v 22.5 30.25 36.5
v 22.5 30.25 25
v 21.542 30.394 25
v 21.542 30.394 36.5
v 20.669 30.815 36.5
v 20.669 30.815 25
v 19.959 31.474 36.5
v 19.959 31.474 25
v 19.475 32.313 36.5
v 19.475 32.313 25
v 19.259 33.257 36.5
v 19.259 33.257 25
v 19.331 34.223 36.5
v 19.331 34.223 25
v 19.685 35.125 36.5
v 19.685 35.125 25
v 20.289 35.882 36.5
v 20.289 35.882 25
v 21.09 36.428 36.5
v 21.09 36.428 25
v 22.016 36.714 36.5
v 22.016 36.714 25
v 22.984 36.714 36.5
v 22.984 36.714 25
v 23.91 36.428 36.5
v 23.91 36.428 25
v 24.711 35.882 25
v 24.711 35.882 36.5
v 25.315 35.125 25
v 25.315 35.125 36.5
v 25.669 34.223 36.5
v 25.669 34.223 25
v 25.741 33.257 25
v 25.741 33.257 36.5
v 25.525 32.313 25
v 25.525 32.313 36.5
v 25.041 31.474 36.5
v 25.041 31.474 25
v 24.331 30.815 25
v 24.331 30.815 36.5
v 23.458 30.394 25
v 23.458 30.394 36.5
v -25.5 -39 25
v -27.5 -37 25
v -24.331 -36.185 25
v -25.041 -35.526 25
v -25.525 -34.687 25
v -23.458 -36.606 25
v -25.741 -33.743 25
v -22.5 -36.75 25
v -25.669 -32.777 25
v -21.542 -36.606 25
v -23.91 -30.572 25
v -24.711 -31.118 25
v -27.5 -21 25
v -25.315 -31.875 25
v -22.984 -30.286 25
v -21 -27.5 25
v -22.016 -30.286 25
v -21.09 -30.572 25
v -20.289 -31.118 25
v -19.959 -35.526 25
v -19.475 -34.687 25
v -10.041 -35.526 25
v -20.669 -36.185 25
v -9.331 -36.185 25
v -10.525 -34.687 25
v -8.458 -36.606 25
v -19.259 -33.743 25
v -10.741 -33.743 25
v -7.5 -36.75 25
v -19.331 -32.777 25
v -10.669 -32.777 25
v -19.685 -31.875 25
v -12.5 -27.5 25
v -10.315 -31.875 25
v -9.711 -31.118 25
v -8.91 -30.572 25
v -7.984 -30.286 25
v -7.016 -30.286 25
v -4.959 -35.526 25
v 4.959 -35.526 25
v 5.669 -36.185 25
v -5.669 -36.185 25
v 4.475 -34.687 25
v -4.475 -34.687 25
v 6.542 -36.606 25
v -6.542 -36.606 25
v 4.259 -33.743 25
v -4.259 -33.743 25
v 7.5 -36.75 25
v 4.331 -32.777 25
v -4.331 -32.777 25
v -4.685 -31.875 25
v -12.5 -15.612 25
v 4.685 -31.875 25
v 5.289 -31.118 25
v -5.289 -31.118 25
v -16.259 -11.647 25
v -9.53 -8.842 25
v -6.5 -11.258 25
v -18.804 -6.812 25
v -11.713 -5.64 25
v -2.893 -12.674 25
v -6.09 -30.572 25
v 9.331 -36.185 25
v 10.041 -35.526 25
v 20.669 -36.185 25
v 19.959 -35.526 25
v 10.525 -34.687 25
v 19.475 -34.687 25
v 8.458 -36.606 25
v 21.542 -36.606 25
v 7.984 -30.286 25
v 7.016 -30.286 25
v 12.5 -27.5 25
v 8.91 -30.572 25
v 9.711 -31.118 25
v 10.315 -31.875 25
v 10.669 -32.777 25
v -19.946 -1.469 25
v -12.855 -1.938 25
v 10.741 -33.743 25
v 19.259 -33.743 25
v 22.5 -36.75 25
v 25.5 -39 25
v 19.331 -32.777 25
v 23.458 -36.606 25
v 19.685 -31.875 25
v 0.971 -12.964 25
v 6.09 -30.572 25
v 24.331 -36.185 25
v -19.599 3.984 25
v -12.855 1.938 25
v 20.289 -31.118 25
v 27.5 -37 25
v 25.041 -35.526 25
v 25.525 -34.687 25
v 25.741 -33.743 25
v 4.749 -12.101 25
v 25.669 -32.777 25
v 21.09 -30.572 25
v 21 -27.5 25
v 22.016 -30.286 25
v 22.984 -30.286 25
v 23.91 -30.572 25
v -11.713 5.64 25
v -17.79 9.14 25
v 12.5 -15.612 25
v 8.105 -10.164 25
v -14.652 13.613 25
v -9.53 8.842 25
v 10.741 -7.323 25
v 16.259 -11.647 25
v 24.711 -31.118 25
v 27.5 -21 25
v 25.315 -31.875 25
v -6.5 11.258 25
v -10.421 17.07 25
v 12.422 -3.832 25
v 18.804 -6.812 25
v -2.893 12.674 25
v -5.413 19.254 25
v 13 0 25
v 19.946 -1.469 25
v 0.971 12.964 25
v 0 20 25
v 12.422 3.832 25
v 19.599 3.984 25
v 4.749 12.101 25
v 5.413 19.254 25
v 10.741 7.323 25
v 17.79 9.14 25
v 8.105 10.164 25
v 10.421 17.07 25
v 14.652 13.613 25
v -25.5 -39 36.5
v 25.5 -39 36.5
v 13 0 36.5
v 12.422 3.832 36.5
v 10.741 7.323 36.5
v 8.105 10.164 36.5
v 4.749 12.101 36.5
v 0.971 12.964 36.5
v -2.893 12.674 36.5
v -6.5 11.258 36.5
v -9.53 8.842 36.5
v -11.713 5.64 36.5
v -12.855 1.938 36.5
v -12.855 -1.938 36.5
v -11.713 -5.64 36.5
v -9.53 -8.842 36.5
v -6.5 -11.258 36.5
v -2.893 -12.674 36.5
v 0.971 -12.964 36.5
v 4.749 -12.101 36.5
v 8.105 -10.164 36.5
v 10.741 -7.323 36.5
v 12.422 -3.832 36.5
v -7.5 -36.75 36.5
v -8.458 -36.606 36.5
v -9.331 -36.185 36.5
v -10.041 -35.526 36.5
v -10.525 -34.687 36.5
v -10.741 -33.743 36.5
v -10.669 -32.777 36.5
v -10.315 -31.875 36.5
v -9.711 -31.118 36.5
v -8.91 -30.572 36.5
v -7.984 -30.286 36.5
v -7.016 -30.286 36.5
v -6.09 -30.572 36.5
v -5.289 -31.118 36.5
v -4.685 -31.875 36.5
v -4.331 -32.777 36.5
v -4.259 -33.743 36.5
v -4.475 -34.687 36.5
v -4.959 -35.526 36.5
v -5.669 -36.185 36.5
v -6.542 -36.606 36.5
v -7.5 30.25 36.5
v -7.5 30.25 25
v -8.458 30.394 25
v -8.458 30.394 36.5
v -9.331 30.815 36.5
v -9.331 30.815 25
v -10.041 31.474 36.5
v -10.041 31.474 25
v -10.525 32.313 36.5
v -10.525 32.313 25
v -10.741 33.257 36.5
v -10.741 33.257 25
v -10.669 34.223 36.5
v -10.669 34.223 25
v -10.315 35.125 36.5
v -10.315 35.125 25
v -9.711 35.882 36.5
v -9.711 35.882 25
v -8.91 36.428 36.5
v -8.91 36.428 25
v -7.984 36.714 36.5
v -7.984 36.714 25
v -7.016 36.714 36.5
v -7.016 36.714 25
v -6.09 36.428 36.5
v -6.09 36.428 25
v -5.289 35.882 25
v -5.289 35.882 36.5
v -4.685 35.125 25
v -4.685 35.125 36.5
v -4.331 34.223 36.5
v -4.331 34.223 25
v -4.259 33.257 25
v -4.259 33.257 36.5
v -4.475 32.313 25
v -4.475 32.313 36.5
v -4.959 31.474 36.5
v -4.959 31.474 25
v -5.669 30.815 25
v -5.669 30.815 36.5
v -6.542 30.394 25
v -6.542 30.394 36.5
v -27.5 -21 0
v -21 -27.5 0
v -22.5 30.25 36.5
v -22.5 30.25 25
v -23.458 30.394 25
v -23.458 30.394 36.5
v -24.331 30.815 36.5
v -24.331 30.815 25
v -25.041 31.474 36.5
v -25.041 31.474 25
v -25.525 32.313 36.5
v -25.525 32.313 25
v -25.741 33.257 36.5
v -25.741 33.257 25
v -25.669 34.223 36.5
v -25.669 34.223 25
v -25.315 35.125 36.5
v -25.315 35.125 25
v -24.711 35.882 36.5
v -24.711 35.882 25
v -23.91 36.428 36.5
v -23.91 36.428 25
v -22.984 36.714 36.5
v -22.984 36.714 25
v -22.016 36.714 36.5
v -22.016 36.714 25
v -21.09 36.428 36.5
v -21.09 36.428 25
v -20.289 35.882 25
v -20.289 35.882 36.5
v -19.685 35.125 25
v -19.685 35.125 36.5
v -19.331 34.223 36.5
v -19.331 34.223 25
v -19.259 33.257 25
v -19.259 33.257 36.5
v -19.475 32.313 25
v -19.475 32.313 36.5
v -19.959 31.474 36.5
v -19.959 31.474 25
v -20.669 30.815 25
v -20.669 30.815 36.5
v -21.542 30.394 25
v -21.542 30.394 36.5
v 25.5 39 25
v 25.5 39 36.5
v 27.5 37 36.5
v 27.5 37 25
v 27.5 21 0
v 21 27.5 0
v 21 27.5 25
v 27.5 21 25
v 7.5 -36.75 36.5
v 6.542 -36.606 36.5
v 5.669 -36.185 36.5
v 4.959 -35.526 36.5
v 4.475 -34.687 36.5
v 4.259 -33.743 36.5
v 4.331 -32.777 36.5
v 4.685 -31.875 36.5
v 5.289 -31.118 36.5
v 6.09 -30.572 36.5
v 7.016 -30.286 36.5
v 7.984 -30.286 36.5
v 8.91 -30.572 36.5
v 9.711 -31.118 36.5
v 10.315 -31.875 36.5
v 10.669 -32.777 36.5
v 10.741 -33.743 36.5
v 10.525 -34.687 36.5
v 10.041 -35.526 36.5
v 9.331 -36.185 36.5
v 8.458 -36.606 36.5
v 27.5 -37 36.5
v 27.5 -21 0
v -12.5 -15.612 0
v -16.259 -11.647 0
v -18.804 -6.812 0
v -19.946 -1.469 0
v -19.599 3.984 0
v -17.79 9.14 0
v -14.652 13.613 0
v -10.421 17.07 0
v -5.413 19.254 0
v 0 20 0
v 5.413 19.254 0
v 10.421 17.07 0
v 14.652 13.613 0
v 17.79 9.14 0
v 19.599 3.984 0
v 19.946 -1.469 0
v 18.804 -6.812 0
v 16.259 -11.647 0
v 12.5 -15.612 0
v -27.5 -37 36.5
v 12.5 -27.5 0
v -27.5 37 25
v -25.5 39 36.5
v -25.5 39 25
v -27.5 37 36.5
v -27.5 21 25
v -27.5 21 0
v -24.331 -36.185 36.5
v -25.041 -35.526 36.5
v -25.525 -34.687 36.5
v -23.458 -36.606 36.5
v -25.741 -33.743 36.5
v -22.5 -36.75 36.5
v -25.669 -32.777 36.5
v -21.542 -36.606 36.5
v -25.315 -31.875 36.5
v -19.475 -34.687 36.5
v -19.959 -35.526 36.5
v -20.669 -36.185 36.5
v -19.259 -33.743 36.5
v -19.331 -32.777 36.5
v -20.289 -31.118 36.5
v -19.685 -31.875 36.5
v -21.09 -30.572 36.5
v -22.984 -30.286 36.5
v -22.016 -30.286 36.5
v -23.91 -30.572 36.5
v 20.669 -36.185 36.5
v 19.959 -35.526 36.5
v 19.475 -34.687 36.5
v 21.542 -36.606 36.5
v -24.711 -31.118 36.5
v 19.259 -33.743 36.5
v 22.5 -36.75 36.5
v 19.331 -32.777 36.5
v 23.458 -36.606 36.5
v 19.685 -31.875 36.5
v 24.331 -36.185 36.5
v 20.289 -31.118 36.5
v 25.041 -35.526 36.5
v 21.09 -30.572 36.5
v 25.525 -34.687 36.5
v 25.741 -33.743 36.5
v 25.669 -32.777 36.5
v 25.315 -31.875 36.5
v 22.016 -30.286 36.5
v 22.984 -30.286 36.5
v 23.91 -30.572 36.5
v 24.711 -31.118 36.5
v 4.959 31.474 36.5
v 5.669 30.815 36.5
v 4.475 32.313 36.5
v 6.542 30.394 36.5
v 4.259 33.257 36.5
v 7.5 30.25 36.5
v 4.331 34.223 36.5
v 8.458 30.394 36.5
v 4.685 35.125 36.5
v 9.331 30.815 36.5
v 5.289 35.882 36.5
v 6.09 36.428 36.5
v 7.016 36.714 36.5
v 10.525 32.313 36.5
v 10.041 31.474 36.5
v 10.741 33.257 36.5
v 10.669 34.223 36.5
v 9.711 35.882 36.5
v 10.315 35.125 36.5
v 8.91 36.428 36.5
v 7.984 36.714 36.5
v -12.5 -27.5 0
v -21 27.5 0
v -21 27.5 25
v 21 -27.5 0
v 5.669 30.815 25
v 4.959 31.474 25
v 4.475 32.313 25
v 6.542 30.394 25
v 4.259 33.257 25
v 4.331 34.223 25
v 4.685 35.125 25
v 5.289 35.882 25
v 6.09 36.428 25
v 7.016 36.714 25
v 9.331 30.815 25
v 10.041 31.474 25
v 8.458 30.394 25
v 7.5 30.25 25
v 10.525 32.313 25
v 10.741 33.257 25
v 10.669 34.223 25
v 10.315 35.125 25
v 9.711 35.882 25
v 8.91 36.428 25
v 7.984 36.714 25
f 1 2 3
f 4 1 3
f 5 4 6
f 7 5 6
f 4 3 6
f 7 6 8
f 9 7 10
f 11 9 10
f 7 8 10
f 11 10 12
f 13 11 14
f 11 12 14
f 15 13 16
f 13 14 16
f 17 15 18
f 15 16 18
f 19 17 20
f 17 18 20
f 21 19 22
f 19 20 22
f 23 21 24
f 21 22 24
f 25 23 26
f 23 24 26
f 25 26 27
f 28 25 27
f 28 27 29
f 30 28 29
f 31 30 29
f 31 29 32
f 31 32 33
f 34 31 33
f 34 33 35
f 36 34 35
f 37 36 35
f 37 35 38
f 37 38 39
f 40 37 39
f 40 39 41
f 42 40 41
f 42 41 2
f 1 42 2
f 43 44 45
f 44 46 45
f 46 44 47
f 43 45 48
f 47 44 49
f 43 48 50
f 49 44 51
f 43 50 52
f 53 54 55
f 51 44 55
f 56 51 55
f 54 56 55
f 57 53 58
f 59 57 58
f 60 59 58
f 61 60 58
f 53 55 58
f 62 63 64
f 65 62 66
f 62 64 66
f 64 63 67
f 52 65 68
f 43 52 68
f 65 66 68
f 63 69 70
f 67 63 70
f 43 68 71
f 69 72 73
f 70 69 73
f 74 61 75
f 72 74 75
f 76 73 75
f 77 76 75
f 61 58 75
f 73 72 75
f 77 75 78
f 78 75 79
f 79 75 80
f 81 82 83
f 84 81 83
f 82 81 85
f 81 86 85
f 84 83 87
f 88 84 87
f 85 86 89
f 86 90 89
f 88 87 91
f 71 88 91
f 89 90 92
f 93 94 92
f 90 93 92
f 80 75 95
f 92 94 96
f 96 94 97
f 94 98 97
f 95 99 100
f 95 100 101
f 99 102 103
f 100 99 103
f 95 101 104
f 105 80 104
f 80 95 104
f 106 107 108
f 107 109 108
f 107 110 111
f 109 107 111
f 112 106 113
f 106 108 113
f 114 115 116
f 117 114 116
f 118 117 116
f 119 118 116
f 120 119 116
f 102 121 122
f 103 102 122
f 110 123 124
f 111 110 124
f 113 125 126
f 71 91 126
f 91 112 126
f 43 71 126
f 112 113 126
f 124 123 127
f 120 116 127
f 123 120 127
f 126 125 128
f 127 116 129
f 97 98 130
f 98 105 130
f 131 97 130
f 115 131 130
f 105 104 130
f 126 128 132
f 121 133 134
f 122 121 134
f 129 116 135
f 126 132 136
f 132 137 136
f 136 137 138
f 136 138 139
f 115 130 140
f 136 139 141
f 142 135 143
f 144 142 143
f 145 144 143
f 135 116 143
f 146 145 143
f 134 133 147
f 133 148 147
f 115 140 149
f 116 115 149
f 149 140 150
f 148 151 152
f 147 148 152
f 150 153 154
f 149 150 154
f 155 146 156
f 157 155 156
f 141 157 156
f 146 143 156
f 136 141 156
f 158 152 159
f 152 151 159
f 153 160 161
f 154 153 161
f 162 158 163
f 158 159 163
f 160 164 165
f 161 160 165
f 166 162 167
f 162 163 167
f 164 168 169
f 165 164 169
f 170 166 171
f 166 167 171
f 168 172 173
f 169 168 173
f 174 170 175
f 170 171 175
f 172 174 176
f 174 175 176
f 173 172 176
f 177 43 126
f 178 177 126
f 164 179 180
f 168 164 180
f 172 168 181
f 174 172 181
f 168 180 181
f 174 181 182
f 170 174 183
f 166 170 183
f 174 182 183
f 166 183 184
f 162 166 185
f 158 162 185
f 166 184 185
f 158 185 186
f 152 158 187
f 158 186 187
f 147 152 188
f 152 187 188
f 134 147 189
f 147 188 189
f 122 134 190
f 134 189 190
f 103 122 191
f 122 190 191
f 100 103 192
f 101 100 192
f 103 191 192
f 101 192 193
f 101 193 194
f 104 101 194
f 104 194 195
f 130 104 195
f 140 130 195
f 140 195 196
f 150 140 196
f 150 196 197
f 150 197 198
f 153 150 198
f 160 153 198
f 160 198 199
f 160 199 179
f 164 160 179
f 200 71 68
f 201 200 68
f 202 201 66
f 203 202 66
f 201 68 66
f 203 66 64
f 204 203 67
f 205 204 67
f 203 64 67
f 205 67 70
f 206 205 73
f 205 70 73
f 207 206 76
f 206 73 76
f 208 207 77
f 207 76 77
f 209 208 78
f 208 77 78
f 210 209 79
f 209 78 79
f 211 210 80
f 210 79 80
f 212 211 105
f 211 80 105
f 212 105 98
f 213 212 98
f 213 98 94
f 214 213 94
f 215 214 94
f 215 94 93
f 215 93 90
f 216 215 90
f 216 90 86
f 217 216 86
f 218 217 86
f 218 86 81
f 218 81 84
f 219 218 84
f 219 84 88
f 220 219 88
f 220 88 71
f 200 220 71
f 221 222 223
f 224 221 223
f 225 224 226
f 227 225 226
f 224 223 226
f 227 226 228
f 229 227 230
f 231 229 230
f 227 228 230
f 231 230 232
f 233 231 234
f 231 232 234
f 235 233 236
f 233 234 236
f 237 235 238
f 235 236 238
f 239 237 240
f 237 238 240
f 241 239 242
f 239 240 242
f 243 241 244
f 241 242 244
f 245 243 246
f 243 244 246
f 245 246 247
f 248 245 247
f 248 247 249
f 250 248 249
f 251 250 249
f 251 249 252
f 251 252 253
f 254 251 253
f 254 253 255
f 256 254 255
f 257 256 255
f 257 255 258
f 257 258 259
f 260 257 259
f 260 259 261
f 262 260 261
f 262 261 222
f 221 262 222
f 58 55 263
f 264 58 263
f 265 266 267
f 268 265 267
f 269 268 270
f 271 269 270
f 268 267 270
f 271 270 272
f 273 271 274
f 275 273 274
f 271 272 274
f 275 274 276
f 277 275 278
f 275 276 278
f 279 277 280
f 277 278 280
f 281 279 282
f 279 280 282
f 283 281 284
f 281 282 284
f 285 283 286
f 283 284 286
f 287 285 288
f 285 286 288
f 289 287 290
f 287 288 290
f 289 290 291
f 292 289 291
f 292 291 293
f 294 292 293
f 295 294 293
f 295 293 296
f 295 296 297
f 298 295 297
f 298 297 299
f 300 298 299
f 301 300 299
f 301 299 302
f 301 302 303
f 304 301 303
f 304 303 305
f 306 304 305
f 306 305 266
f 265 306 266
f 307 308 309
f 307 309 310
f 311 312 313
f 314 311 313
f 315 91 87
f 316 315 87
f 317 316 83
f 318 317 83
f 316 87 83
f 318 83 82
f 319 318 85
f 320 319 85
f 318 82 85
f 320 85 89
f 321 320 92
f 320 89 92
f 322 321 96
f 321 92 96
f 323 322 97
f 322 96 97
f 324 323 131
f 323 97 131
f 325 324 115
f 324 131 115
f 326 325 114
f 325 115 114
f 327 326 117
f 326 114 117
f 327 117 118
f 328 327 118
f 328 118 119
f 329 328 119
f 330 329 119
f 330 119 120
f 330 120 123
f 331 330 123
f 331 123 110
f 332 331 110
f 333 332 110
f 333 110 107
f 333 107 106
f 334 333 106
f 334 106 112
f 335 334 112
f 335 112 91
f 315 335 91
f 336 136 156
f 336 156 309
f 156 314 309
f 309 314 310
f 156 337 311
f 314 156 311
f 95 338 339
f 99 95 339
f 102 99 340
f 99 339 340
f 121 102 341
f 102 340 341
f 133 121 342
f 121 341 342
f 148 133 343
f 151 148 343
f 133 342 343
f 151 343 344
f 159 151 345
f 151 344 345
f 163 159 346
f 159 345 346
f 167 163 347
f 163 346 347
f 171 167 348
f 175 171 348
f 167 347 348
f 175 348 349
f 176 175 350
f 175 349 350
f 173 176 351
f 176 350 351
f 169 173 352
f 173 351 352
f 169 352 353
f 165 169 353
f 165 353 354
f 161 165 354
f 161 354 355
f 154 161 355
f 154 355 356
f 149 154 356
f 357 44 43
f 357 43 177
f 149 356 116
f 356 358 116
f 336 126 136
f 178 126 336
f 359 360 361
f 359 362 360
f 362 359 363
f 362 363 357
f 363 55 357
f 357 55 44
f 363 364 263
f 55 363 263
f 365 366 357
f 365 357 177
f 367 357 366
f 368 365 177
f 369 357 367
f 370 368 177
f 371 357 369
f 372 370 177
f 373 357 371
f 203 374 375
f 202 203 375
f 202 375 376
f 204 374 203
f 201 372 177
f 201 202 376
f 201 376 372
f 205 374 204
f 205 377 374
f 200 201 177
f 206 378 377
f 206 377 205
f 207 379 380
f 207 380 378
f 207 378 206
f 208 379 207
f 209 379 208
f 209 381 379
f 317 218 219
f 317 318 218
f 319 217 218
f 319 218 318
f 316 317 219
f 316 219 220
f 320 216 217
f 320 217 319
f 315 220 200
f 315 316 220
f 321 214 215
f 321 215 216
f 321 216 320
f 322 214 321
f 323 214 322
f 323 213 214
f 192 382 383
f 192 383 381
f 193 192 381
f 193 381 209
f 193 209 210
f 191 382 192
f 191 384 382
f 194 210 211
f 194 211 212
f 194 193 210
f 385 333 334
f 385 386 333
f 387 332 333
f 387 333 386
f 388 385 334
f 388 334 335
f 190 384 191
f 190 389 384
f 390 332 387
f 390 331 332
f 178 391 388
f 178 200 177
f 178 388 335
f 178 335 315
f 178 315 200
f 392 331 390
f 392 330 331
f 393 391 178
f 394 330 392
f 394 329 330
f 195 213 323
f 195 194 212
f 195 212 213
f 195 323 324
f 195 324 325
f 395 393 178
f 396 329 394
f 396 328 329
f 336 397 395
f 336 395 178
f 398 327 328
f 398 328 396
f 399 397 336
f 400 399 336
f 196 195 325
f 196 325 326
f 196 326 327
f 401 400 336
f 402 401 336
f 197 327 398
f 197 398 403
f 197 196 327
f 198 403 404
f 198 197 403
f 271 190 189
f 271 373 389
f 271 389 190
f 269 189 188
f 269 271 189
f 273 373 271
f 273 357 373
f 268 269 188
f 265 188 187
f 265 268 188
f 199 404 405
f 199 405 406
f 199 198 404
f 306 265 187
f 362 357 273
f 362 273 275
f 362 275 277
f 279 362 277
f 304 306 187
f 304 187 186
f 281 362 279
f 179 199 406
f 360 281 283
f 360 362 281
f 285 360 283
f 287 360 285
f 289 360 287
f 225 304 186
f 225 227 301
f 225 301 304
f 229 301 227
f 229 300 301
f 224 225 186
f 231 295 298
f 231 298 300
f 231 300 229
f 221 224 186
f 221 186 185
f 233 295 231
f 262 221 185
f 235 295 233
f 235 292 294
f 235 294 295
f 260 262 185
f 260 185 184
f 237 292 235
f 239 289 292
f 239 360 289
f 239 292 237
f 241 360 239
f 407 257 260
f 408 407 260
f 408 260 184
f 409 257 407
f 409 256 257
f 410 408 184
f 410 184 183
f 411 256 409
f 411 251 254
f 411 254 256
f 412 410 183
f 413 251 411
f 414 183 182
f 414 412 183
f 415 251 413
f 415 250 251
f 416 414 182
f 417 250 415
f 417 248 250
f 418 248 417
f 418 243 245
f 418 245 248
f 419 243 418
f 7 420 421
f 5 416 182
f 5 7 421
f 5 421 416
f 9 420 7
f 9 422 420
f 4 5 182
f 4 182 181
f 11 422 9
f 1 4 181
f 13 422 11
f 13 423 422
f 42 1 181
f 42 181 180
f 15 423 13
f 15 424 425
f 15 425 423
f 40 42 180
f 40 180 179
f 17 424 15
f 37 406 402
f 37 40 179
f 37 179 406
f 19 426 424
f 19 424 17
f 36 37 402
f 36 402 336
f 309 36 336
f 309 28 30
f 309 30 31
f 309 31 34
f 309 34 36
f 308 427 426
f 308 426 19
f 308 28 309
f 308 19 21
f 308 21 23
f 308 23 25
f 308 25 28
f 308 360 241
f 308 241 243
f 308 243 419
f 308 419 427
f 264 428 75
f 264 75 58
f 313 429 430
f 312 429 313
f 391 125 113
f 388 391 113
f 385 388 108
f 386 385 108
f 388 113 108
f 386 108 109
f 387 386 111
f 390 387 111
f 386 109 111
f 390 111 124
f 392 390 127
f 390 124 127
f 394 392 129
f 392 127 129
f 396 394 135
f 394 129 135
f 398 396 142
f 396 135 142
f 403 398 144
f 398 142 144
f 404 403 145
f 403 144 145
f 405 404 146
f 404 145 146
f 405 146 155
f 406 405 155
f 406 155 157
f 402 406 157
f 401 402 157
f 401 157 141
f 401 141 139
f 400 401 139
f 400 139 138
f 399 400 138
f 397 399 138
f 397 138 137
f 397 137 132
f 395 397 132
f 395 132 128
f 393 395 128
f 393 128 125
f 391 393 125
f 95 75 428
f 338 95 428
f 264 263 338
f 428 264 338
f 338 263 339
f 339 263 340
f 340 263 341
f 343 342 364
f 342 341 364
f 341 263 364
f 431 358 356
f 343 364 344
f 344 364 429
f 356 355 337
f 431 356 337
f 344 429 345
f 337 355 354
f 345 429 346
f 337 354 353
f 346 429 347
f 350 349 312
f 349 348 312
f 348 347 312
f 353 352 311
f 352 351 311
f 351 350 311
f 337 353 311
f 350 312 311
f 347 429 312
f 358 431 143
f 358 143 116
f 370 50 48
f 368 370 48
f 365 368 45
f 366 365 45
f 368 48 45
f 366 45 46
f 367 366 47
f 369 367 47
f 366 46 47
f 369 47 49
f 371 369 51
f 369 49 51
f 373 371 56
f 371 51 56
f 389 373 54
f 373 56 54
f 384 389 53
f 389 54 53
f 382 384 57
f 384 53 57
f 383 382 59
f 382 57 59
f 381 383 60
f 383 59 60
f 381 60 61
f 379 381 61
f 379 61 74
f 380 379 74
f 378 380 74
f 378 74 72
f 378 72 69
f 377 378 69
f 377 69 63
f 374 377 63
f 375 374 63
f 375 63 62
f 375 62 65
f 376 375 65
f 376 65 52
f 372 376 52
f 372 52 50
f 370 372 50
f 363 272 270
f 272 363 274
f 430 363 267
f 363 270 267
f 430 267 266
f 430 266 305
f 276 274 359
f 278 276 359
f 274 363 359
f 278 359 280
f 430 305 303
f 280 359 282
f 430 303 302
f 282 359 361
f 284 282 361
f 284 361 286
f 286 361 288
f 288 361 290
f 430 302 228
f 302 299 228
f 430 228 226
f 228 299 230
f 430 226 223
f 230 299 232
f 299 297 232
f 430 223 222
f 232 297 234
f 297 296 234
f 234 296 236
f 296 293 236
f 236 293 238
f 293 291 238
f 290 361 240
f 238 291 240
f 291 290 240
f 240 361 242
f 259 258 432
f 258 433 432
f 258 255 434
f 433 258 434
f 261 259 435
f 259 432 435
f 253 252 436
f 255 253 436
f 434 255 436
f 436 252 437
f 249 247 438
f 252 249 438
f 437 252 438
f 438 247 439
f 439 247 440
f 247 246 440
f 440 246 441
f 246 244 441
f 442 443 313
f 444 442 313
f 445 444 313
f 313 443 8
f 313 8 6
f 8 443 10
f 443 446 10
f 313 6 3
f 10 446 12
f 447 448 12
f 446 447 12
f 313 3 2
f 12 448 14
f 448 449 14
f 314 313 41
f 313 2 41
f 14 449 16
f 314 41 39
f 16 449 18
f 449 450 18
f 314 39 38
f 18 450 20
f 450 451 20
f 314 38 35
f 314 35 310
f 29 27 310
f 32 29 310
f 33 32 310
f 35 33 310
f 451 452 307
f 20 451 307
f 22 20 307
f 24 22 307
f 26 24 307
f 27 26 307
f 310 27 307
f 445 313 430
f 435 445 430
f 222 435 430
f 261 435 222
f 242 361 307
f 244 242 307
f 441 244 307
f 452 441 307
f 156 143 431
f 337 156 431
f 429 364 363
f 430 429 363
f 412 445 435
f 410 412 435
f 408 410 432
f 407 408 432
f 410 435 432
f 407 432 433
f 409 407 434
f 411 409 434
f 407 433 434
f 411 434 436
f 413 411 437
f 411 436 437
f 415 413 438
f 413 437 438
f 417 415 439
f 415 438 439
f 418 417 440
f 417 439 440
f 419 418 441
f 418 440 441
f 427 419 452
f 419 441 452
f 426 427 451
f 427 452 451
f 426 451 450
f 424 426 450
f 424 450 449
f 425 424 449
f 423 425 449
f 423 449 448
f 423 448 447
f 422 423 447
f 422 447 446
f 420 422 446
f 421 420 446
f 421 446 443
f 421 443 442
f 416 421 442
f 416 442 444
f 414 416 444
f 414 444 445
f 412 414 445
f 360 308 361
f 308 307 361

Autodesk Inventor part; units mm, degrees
ref_plane "YZ Plane" through (0, 0, 0) normal (1, 0, 0) x (0, 1, 0)
ref_plane "XZ Plane" through (0, 0, 0) normal (0, 1, 0) x (-1, 0, 0)
ref_plane "XY Plane" through (0, 0, 0) normal (0, 0, 1) x (1, 0, 0)
sketch "Sketch1" plane through (0, 0, 0) normal (0, 0, 1) x (1, 0, 0)
  line L0 (-27.5, 27.5) -> (27.5, 27.5)
  line L1 (27.5, 27.5) -> (27.5, -27.5)
  line L2 (27.5, -27.5) -> (-27.5, -27.5)
  line L3 (-27.5, -27.5) -> (-27.5, 27.5)
  line L4 (-27.5, 27.5) -> (27.5, -27.5) construction
  line L5 (27.5, 27.5) -> (-27.5, -27.5) construction
  point P0 (0, 0)
  dimension "d0" = 55
  dimension "d1" = 55
extrude "Extrusion1" add sketch "Sketch1" along normal blind 25
sketch "Sketch2" plane through (0, 0, 25) normal (0, 0, 1) x (1, 0, 0)
  line L0 (27.5, 39) -> (-27.5, 39)
  line L1 (-27.5, 39) -> (-27.5, -39)
  line L2 (-27.5, -39) -> (27.5, -39)
  line L3 (27.5, -39) -> (27.5, 39)
  line L4 (27.5, 39) -> (-27.5, -39) construction
  line L5 (-27.5, 39) -> (27.5, -39) construction
  point P0 (0, 0)
  dimension "d4" = 55
  dimension "d5" = 78
extrude "Extrusion2" add sketch "Sketch2" along normal blind 11.5
sketch "Sketch3" plane through (0, 0, 36.5) normal (0, 0, 1) x (1, 0, 0)
  circle A0 centre (0, 0) radius 13
extrude "Extrusion3" cut sketch "Sketch3" against normal through all
sketch "Sketch4" plane through (0, 0, 36.5) normal (0, 0, 1) x (1, 0, 0)
  line L0 (27.5, -39) -> (27.5, 39) projected
  line L1 (27.5, 39) -> (-27.5, 39) projected
  line L2 (-27.5, 39) -> (-27.5, -39) projected
  line L3 (-27.5, -39) -> (27.5, -39) projected
  point P0 (0, 0)
  point P1 (22.5, 33.5)
  point P2 (22.5, -33.5)
  point P3 (7.5, 33.5)
  point P4 (7.5, -33.5)
  point P5 (-7.5, 33.5)
  point P6 (-7.5, -33.5)
  point P7 (-22.5, 33.5)
  point P8 (-22.5, -33.5)
  dimension "d10" = 5
  dimension "d11" = 5.5
  dimension "d14" = 67
  dimension "d17" = 15
  dimension "d20" = 5
  dimension "d21" = 5.5
hole "Hole1" at (22.5, 33.5, 36.5) at (22.5, -33.5, 36.5) at (7.5, 33.5, 36.5) at (7.5, -33.5, 36.5) at (-7.5, 33.5, 36.5) at (-7.5, -33.5, 36.5) at (-22.5, 33.5, 36.5) at (-22.5, -33.5, 36.5) direction (0, 0, -1) diameter 6.5 end through all
sketch "Sketch6" plane through (0, 0, 0) normal (0, 0, -1) x (-1, 0, 0)
  circle A0 centre (0, 0) radius 20
  dimension "d40" = 40
extrude "Extrusion5" cut sketch "Sketch6" against normal blind 25
chamfer "Chamfer1" distance 6.5 angle 45 4 edges at (27.5, -27.5, 12.5) (-27.5, -27.5, 12.5) (-27.5, 27.5, 12.5) (27.5, 27.5, 12.5)
chamfer "Chamfer2" distance 2 angle 45 4 edges at (27.5, -39, 30.75) (-27.5, -39, 30.75) (27.5, 39, 30.75) (-27.5, 39, 30.75)
sketch "Sketch5" plane through (-21, -27.5, 0) normal (0, -1, 0) x (1, 0, 0)
  line L0 (42, 0) -> (0, 0) projected
  line L1 (0, 25) -> (42, 25) projected
  line L2 (8.5, 0) -> (33.5, 0)
  line L3 (33.5, 0) -> (33.5, 25)
  line L4 (33.5, 25) -> (8.5, 25)
  line L5 (8.5, 25) -> (8.5, 0)
  point P0 (21, 0)
  dimension "d35" = 25
  dimension "d36" = 12.5
  dimension "d37" = 12.5
extrude "Extrusion4" cut sketch "Sketch5" against normal blind 28
equation "\"d4\" = d0"
properties part number "Y-servo-flange" material "Aluminum 6061-AHC"
